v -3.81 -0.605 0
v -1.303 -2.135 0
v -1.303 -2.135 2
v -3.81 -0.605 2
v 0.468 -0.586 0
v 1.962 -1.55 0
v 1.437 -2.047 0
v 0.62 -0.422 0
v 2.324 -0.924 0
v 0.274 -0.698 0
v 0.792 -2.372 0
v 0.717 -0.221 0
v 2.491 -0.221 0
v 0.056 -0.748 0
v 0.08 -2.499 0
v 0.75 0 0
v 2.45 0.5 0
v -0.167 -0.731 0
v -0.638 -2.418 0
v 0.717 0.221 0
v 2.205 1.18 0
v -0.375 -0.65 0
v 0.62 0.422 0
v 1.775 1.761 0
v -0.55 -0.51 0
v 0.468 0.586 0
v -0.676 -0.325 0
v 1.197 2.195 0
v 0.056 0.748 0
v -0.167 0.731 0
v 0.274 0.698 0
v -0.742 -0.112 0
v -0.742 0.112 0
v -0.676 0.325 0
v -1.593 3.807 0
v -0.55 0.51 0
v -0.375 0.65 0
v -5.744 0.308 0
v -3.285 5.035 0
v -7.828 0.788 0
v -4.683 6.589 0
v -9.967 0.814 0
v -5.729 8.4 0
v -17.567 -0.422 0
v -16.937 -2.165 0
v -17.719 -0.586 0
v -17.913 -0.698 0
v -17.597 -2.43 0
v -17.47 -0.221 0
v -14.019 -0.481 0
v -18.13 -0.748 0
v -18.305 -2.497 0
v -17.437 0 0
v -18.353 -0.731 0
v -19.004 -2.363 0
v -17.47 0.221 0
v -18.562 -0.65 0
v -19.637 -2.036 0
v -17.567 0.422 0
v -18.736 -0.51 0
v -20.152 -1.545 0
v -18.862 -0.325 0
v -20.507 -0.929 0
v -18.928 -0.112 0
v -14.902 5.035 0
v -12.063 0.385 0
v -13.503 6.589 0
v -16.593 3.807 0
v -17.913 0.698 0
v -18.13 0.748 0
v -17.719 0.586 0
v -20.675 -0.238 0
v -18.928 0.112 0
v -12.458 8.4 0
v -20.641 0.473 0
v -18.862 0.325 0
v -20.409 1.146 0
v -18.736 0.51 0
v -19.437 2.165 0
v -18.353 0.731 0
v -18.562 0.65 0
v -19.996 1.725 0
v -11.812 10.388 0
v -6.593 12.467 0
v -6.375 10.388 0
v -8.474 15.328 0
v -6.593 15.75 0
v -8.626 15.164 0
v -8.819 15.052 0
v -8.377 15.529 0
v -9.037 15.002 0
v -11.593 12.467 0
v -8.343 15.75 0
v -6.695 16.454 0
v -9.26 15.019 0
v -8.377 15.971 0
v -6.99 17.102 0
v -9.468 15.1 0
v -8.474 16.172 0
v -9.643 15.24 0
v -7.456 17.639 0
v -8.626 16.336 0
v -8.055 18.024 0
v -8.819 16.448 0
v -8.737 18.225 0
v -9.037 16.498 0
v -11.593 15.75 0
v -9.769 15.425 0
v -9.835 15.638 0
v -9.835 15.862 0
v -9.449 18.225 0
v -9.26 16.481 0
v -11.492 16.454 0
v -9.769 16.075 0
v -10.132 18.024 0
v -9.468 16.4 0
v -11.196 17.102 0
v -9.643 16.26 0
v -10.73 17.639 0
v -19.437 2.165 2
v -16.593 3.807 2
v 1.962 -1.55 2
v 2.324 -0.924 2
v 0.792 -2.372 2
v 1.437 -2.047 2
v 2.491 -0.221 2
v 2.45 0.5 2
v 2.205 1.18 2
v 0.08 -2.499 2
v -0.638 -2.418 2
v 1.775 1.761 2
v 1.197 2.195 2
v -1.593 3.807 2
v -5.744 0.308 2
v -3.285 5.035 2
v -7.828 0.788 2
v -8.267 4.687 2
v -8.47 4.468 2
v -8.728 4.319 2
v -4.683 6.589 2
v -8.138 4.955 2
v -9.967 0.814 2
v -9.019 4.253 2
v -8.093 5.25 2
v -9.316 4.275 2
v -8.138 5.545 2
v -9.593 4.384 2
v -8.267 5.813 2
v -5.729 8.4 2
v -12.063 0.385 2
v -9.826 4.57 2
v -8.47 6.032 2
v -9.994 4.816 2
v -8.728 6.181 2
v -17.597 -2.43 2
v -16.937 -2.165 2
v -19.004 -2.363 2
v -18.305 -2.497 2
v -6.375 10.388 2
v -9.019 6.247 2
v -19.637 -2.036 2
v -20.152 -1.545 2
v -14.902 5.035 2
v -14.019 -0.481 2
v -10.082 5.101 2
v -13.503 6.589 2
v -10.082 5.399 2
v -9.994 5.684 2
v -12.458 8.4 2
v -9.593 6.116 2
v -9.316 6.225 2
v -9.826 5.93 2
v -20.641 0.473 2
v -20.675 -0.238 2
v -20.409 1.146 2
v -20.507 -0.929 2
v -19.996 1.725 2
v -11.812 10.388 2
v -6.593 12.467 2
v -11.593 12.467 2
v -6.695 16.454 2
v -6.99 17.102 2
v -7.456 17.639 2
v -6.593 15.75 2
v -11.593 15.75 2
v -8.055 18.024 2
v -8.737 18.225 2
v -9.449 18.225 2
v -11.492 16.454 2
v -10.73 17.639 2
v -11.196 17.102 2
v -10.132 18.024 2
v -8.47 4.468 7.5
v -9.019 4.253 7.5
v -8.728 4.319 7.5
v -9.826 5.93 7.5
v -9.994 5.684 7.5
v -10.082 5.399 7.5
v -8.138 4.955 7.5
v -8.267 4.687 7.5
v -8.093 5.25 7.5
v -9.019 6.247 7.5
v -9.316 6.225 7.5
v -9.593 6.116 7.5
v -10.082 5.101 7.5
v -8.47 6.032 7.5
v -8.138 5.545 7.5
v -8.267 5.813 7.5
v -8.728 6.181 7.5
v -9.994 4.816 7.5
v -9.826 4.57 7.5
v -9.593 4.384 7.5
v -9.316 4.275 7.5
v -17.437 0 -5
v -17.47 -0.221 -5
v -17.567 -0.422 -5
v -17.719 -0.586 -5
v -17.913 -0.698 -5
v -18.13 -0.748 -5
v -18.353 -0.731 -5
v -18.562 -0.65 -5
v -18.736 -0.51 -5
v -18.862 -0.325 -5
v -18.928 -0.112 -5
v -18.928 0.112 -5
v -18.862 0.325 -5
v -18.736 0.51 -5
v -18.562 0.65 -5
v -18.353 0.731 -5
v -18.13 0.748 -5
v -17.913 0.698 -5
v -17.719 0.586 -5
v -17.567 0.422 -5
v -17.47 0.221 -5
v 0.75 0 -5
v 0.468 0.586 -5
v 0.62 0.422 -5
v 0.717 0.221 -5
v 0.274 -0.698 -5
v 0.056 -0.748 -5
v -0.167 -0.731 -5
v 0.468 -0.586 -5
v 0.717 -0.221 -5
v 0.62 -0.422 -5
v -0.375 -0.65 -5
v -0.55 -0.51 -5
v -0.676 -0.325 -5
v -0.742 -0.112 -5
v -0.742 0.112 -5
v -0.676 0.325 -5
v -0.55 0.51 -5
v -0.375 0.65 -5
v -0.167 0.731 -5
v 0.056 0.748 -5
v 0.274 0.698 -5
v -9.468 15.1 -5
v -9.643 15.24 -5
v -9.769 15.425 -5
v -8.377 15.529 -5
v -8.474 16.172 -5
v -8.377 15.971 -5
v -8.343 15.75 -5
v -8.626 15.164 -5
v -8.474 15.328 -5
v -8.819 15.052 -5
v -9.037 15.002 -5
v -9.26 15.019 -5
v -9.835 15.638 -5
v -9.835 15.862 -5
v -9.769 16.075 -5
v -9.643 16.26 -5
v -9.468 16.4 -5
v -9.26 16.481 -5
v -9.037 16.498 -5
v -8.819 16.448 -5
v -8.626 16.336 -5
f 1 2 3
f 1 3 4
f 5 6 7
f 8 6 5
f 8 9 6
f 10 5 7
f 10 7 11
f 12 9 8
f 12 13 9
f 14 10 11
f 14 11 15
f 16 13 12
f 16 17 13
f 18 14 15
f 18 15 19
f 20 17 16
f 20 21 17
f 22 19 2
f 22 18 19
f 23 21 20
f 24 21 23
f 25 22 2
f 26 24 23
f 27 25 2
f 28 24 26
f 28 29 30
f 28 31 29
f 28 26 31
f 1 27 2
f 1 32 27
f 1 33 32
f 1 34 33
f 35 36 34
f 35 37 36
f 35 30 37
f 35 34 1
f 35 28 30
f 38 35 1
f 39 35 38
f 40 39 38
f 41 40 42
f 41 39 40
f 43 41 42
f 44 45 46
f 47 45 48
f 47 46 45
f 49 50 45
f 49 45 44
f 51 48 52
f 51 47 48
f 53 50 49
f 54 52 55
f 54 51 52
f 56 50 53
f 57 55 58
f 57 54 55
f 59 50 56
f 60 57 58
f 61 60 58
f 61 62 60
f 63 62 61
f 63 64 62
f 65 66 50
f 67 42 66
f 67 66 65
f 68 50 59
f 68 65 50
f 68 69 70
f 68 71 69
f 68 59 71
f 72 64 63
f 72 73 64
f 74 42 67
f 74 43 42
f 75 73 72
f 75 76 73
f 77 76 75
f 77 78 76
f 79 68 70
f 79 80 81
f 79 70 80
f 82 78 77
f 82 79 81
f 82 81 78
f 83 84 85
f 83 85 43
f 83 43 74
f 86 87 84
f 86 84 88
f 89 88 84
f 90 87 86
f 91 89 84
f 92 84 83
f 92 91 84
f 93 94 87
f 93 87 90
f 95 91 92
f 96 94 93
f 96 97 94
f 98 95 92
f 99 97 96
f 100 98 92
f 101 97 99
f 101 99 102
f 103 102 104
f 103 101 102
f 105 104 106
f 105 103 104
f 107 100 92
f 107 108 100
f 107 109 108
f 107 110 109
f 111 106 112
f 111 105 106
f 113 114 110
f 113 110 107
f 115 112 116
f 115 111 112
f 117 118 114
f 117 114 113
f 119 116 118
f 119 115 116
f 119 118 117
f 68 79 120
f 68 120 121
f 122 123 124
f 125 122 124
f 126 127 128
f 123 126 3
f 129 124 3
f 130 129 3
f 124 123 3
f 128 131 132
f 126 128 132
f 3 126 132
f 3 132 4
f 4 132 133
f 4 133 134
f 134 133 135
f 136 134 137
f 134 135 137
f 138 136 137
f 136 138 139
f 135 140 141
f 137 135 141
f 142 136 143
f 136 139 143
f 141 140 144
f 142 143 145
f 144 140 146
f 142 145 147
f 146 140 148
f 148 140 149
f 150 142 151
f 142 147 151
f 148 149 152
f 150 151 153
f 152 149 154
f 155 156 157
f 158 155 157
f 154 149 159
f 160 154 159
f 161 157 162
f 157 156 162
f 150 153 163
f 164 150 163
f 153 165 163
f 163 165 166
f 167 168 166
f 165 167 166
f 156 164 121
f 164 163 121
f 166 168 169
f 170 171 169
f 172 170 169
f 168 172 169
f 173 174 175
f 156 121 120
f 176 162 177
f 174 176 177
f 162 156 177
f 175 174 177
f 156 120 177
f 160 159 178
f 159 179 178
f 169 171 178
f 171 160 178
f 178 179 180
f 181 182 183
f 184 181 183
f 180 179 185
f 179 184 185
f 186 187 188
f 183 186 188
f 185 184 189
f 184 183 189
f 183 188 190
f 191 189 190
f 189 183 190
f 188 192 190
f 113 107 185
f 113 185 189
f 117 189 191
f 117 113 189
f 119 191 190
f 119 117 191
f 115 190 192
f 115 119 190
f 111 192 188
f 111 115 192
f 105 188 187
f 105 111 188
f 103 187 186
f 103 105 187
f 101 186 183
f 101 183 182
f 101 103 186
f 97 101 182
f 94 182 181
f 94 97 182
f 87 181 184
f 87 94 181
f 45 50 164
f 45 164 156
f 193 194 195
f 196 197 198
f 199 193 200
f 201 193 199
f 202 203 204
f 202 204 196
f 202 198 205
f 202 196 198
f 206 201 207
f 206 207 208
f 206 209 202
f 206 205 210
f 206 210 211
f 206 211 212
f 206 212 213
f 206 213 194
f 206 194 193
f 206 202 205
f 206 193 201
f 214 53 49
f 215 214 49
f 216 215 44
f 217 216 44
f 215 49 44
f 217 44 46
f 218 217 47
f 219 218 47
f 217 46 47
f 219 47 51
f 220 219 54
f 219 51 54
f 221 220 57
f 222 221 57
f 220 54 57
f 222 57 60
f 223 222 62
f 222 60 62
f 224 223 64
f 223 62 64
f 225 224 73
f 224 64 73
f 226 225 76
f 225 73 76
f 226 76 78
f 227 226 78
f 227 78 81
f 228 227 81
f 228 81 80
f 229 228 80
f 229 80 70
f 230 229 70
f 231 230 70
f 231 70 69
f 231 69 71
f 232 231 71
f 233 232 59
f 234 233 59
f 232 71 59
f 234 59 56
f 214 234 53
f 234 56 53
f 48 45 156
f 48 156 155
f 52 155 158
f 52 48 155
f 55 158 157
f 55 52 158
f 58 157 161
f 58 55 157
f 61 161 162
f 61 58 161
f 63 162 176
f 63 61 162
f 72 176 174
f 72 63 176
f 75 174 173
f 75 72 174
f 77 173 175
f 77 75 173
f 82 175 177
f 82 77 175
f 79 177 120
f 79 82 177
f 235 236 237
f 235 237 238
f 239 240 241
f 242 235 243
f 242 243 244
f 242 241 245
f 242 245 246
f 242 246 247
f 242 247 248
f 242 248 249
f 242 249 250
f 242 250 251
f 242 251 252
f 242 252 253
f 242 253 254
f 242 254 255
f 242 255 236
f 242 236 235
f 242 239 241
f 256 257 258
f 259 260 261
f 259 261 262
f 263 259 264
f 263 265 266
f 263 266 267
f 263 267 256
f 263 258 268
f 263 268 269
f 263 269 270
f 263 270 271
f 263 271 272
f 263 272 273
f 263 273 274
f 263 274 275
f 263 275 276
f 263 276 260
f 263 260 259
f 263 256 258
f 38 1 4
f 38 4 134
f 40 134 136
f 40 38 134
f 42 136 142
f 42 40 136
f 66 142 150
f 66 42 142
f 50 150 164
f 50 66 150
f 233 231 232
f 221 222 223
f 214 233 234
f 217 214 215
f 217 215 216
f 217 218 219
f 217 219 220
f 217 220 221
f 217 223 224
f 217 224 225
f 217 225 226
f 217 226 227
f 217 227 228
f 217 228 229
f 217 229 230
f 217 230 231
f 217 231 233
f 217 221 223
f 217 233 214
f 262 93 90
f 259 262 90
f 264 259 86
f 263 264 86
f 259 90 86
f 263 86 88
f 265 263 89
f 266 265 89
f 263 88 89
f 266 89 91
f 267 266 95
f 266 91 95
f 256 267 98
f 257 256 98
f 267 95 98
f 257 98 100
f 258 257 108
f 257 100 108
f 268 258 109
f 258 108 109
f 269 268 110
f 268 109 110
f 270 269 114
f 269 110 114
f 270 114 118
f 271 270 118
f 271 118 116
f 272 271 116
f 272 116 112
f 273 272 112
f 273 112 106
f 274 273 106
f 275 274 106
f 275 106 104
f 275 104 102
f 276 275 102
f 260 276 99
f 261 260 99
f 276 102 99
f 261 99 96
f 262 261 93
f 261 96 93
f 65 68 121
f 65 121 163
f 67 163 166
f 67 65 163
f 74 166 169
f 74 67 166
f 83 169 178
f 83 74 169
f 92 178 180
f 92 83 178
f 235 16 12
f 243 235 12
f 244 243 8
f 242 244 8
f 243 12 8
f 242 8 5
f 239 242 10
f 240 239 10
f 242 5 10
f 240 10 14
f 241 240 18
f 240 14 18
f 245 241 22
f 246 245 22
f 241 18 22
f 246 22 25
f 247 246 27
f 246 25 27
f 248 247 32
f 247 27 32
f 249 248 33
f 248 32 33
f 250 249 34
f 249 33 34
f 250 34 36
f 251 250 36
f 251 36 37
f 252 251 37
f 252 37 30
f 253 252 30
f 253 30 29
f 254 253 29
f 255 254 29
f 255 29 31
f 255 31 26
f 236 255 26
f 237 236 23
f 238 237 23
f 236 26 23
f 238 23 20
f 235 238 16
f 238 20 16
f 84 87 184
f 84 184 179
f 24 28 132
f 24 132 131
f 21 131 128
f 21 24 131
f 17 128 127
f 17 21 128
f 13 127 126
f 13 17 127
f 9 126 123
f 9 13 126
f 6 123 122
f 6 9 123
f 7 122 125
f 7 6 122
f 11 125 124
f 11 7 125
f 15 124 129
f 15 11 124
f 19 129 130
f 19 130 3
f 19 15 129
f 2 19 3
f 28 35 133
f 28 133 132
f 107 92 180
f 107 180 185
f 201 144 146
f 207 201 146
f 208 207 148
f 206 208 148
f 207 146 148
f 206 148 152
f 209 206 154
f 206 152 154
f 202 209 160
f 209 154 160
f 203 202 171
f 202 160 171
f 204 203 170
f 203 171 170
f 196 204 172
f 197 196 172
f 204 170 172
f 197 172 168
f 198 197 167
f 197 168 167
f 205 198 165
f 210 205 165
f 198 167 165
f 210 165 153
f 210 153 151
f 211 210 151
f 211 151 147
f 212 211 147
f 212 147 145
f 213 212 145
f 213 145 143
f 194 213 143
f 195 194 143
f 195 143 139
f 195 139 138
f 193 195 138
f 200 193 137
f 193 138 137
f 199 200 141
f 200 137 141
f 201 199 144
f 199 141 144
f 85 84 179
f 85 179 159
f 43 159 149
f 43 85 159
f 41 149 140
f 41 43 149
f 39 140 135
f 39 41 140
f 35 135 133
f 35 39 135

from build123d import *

# Parameters (mm, degrees)
EXTRUDE_1_DEPTH = 2
SKETCH_2_R      = 0.75
EXTRUDE_2_DEPTH = 5
SKETCH_4_R      = 1
EXTRUDE_3_DEPTH = 5.5


with BuildPart() as part:
    # Эскиз1 → Бобышка-Вытянуть1 (new body)
    with BuildSketch(Plane.XY):
        with BuildLine():
            Line((-1.3027145, -2.134628779), (-3.80950787, -0.604790849))
            ThreePointArc((-3.80950787, -0.604790849), (-8.89711015, 0.858483074), (-14.018822021, -0.480522171))
            Line((-14.018822021, -0.480522171), (-16.936533206, -2.16506351))
            ThreePointArc((-16.936533206, -2.16506351), (-20.351596716, -1.25), (-19.436533206, 2.16506351))
            Line((-19.436533206, 2.16506351), (-16.593266604, 3.806624248))
            ThreePointArc((-16.593266604, 3.806624248), (-12.933012566, 7.466878286), (-11.593266604, 12.466878286))
            Line((-11.593266604, 12.466878286), (-11.593266604, 15.749999763))
            ThreePointArc((-11.593266604, 15.749999763), (-9.093266603, 18.249999764), (-6.593266603, 15.749999763))
            Line((-6.593266603, 15.749999763), (-6.593266603, 12.466878286))
            ThreePointArc((-6.593266603, 12.466878286), (-5.253520641, 7.466878286), (-1.593266603, 3.806624248))
            Line((-1.593266603, 3.806624248), (1.1972855, 2.19549824))
            ThreePointArc((1.1972855, 2.19549824), (2.165705155, -1.250370454), (-1.3027145, -2.134628779))
        make_face()
    extrude(amount=EXTRUDE_1_DEPTH)

    # Эскиз2 → Бобышка-Вытянуть2 (add)
    with BuildSketch(Plane(origin=(0, 0, 0), x_dir=(-1, 0, 0), z_dir=(0, 0, -1))):
        with Locations(Location((0, 0, 0), (0, 0, 180))):
            Circle(SKETCH_2_R)
        with Locations(Location((9.093266603, 15.749999763, 0), (0, 0, 180))):
            Circle(SKETCH_2_R)
        with Locations(Location((18.186533206, 0, 0), (0, 0, 180))):
            Circle(SKETCH_2_R)
    extrude(amount=EXTRUDE_2_DEPTH)

    # Эскиз4 → Бобышка-Вытянуть3 (add)
    with BuildSketch(Plane.XY.offset(2)):
        with Locations((-9.093266603, 5.249999921)):
            Circle(SKETCH_4_R)
    extrude(amount=EXTRUDE_3_DEPTH)


solid = part.part
